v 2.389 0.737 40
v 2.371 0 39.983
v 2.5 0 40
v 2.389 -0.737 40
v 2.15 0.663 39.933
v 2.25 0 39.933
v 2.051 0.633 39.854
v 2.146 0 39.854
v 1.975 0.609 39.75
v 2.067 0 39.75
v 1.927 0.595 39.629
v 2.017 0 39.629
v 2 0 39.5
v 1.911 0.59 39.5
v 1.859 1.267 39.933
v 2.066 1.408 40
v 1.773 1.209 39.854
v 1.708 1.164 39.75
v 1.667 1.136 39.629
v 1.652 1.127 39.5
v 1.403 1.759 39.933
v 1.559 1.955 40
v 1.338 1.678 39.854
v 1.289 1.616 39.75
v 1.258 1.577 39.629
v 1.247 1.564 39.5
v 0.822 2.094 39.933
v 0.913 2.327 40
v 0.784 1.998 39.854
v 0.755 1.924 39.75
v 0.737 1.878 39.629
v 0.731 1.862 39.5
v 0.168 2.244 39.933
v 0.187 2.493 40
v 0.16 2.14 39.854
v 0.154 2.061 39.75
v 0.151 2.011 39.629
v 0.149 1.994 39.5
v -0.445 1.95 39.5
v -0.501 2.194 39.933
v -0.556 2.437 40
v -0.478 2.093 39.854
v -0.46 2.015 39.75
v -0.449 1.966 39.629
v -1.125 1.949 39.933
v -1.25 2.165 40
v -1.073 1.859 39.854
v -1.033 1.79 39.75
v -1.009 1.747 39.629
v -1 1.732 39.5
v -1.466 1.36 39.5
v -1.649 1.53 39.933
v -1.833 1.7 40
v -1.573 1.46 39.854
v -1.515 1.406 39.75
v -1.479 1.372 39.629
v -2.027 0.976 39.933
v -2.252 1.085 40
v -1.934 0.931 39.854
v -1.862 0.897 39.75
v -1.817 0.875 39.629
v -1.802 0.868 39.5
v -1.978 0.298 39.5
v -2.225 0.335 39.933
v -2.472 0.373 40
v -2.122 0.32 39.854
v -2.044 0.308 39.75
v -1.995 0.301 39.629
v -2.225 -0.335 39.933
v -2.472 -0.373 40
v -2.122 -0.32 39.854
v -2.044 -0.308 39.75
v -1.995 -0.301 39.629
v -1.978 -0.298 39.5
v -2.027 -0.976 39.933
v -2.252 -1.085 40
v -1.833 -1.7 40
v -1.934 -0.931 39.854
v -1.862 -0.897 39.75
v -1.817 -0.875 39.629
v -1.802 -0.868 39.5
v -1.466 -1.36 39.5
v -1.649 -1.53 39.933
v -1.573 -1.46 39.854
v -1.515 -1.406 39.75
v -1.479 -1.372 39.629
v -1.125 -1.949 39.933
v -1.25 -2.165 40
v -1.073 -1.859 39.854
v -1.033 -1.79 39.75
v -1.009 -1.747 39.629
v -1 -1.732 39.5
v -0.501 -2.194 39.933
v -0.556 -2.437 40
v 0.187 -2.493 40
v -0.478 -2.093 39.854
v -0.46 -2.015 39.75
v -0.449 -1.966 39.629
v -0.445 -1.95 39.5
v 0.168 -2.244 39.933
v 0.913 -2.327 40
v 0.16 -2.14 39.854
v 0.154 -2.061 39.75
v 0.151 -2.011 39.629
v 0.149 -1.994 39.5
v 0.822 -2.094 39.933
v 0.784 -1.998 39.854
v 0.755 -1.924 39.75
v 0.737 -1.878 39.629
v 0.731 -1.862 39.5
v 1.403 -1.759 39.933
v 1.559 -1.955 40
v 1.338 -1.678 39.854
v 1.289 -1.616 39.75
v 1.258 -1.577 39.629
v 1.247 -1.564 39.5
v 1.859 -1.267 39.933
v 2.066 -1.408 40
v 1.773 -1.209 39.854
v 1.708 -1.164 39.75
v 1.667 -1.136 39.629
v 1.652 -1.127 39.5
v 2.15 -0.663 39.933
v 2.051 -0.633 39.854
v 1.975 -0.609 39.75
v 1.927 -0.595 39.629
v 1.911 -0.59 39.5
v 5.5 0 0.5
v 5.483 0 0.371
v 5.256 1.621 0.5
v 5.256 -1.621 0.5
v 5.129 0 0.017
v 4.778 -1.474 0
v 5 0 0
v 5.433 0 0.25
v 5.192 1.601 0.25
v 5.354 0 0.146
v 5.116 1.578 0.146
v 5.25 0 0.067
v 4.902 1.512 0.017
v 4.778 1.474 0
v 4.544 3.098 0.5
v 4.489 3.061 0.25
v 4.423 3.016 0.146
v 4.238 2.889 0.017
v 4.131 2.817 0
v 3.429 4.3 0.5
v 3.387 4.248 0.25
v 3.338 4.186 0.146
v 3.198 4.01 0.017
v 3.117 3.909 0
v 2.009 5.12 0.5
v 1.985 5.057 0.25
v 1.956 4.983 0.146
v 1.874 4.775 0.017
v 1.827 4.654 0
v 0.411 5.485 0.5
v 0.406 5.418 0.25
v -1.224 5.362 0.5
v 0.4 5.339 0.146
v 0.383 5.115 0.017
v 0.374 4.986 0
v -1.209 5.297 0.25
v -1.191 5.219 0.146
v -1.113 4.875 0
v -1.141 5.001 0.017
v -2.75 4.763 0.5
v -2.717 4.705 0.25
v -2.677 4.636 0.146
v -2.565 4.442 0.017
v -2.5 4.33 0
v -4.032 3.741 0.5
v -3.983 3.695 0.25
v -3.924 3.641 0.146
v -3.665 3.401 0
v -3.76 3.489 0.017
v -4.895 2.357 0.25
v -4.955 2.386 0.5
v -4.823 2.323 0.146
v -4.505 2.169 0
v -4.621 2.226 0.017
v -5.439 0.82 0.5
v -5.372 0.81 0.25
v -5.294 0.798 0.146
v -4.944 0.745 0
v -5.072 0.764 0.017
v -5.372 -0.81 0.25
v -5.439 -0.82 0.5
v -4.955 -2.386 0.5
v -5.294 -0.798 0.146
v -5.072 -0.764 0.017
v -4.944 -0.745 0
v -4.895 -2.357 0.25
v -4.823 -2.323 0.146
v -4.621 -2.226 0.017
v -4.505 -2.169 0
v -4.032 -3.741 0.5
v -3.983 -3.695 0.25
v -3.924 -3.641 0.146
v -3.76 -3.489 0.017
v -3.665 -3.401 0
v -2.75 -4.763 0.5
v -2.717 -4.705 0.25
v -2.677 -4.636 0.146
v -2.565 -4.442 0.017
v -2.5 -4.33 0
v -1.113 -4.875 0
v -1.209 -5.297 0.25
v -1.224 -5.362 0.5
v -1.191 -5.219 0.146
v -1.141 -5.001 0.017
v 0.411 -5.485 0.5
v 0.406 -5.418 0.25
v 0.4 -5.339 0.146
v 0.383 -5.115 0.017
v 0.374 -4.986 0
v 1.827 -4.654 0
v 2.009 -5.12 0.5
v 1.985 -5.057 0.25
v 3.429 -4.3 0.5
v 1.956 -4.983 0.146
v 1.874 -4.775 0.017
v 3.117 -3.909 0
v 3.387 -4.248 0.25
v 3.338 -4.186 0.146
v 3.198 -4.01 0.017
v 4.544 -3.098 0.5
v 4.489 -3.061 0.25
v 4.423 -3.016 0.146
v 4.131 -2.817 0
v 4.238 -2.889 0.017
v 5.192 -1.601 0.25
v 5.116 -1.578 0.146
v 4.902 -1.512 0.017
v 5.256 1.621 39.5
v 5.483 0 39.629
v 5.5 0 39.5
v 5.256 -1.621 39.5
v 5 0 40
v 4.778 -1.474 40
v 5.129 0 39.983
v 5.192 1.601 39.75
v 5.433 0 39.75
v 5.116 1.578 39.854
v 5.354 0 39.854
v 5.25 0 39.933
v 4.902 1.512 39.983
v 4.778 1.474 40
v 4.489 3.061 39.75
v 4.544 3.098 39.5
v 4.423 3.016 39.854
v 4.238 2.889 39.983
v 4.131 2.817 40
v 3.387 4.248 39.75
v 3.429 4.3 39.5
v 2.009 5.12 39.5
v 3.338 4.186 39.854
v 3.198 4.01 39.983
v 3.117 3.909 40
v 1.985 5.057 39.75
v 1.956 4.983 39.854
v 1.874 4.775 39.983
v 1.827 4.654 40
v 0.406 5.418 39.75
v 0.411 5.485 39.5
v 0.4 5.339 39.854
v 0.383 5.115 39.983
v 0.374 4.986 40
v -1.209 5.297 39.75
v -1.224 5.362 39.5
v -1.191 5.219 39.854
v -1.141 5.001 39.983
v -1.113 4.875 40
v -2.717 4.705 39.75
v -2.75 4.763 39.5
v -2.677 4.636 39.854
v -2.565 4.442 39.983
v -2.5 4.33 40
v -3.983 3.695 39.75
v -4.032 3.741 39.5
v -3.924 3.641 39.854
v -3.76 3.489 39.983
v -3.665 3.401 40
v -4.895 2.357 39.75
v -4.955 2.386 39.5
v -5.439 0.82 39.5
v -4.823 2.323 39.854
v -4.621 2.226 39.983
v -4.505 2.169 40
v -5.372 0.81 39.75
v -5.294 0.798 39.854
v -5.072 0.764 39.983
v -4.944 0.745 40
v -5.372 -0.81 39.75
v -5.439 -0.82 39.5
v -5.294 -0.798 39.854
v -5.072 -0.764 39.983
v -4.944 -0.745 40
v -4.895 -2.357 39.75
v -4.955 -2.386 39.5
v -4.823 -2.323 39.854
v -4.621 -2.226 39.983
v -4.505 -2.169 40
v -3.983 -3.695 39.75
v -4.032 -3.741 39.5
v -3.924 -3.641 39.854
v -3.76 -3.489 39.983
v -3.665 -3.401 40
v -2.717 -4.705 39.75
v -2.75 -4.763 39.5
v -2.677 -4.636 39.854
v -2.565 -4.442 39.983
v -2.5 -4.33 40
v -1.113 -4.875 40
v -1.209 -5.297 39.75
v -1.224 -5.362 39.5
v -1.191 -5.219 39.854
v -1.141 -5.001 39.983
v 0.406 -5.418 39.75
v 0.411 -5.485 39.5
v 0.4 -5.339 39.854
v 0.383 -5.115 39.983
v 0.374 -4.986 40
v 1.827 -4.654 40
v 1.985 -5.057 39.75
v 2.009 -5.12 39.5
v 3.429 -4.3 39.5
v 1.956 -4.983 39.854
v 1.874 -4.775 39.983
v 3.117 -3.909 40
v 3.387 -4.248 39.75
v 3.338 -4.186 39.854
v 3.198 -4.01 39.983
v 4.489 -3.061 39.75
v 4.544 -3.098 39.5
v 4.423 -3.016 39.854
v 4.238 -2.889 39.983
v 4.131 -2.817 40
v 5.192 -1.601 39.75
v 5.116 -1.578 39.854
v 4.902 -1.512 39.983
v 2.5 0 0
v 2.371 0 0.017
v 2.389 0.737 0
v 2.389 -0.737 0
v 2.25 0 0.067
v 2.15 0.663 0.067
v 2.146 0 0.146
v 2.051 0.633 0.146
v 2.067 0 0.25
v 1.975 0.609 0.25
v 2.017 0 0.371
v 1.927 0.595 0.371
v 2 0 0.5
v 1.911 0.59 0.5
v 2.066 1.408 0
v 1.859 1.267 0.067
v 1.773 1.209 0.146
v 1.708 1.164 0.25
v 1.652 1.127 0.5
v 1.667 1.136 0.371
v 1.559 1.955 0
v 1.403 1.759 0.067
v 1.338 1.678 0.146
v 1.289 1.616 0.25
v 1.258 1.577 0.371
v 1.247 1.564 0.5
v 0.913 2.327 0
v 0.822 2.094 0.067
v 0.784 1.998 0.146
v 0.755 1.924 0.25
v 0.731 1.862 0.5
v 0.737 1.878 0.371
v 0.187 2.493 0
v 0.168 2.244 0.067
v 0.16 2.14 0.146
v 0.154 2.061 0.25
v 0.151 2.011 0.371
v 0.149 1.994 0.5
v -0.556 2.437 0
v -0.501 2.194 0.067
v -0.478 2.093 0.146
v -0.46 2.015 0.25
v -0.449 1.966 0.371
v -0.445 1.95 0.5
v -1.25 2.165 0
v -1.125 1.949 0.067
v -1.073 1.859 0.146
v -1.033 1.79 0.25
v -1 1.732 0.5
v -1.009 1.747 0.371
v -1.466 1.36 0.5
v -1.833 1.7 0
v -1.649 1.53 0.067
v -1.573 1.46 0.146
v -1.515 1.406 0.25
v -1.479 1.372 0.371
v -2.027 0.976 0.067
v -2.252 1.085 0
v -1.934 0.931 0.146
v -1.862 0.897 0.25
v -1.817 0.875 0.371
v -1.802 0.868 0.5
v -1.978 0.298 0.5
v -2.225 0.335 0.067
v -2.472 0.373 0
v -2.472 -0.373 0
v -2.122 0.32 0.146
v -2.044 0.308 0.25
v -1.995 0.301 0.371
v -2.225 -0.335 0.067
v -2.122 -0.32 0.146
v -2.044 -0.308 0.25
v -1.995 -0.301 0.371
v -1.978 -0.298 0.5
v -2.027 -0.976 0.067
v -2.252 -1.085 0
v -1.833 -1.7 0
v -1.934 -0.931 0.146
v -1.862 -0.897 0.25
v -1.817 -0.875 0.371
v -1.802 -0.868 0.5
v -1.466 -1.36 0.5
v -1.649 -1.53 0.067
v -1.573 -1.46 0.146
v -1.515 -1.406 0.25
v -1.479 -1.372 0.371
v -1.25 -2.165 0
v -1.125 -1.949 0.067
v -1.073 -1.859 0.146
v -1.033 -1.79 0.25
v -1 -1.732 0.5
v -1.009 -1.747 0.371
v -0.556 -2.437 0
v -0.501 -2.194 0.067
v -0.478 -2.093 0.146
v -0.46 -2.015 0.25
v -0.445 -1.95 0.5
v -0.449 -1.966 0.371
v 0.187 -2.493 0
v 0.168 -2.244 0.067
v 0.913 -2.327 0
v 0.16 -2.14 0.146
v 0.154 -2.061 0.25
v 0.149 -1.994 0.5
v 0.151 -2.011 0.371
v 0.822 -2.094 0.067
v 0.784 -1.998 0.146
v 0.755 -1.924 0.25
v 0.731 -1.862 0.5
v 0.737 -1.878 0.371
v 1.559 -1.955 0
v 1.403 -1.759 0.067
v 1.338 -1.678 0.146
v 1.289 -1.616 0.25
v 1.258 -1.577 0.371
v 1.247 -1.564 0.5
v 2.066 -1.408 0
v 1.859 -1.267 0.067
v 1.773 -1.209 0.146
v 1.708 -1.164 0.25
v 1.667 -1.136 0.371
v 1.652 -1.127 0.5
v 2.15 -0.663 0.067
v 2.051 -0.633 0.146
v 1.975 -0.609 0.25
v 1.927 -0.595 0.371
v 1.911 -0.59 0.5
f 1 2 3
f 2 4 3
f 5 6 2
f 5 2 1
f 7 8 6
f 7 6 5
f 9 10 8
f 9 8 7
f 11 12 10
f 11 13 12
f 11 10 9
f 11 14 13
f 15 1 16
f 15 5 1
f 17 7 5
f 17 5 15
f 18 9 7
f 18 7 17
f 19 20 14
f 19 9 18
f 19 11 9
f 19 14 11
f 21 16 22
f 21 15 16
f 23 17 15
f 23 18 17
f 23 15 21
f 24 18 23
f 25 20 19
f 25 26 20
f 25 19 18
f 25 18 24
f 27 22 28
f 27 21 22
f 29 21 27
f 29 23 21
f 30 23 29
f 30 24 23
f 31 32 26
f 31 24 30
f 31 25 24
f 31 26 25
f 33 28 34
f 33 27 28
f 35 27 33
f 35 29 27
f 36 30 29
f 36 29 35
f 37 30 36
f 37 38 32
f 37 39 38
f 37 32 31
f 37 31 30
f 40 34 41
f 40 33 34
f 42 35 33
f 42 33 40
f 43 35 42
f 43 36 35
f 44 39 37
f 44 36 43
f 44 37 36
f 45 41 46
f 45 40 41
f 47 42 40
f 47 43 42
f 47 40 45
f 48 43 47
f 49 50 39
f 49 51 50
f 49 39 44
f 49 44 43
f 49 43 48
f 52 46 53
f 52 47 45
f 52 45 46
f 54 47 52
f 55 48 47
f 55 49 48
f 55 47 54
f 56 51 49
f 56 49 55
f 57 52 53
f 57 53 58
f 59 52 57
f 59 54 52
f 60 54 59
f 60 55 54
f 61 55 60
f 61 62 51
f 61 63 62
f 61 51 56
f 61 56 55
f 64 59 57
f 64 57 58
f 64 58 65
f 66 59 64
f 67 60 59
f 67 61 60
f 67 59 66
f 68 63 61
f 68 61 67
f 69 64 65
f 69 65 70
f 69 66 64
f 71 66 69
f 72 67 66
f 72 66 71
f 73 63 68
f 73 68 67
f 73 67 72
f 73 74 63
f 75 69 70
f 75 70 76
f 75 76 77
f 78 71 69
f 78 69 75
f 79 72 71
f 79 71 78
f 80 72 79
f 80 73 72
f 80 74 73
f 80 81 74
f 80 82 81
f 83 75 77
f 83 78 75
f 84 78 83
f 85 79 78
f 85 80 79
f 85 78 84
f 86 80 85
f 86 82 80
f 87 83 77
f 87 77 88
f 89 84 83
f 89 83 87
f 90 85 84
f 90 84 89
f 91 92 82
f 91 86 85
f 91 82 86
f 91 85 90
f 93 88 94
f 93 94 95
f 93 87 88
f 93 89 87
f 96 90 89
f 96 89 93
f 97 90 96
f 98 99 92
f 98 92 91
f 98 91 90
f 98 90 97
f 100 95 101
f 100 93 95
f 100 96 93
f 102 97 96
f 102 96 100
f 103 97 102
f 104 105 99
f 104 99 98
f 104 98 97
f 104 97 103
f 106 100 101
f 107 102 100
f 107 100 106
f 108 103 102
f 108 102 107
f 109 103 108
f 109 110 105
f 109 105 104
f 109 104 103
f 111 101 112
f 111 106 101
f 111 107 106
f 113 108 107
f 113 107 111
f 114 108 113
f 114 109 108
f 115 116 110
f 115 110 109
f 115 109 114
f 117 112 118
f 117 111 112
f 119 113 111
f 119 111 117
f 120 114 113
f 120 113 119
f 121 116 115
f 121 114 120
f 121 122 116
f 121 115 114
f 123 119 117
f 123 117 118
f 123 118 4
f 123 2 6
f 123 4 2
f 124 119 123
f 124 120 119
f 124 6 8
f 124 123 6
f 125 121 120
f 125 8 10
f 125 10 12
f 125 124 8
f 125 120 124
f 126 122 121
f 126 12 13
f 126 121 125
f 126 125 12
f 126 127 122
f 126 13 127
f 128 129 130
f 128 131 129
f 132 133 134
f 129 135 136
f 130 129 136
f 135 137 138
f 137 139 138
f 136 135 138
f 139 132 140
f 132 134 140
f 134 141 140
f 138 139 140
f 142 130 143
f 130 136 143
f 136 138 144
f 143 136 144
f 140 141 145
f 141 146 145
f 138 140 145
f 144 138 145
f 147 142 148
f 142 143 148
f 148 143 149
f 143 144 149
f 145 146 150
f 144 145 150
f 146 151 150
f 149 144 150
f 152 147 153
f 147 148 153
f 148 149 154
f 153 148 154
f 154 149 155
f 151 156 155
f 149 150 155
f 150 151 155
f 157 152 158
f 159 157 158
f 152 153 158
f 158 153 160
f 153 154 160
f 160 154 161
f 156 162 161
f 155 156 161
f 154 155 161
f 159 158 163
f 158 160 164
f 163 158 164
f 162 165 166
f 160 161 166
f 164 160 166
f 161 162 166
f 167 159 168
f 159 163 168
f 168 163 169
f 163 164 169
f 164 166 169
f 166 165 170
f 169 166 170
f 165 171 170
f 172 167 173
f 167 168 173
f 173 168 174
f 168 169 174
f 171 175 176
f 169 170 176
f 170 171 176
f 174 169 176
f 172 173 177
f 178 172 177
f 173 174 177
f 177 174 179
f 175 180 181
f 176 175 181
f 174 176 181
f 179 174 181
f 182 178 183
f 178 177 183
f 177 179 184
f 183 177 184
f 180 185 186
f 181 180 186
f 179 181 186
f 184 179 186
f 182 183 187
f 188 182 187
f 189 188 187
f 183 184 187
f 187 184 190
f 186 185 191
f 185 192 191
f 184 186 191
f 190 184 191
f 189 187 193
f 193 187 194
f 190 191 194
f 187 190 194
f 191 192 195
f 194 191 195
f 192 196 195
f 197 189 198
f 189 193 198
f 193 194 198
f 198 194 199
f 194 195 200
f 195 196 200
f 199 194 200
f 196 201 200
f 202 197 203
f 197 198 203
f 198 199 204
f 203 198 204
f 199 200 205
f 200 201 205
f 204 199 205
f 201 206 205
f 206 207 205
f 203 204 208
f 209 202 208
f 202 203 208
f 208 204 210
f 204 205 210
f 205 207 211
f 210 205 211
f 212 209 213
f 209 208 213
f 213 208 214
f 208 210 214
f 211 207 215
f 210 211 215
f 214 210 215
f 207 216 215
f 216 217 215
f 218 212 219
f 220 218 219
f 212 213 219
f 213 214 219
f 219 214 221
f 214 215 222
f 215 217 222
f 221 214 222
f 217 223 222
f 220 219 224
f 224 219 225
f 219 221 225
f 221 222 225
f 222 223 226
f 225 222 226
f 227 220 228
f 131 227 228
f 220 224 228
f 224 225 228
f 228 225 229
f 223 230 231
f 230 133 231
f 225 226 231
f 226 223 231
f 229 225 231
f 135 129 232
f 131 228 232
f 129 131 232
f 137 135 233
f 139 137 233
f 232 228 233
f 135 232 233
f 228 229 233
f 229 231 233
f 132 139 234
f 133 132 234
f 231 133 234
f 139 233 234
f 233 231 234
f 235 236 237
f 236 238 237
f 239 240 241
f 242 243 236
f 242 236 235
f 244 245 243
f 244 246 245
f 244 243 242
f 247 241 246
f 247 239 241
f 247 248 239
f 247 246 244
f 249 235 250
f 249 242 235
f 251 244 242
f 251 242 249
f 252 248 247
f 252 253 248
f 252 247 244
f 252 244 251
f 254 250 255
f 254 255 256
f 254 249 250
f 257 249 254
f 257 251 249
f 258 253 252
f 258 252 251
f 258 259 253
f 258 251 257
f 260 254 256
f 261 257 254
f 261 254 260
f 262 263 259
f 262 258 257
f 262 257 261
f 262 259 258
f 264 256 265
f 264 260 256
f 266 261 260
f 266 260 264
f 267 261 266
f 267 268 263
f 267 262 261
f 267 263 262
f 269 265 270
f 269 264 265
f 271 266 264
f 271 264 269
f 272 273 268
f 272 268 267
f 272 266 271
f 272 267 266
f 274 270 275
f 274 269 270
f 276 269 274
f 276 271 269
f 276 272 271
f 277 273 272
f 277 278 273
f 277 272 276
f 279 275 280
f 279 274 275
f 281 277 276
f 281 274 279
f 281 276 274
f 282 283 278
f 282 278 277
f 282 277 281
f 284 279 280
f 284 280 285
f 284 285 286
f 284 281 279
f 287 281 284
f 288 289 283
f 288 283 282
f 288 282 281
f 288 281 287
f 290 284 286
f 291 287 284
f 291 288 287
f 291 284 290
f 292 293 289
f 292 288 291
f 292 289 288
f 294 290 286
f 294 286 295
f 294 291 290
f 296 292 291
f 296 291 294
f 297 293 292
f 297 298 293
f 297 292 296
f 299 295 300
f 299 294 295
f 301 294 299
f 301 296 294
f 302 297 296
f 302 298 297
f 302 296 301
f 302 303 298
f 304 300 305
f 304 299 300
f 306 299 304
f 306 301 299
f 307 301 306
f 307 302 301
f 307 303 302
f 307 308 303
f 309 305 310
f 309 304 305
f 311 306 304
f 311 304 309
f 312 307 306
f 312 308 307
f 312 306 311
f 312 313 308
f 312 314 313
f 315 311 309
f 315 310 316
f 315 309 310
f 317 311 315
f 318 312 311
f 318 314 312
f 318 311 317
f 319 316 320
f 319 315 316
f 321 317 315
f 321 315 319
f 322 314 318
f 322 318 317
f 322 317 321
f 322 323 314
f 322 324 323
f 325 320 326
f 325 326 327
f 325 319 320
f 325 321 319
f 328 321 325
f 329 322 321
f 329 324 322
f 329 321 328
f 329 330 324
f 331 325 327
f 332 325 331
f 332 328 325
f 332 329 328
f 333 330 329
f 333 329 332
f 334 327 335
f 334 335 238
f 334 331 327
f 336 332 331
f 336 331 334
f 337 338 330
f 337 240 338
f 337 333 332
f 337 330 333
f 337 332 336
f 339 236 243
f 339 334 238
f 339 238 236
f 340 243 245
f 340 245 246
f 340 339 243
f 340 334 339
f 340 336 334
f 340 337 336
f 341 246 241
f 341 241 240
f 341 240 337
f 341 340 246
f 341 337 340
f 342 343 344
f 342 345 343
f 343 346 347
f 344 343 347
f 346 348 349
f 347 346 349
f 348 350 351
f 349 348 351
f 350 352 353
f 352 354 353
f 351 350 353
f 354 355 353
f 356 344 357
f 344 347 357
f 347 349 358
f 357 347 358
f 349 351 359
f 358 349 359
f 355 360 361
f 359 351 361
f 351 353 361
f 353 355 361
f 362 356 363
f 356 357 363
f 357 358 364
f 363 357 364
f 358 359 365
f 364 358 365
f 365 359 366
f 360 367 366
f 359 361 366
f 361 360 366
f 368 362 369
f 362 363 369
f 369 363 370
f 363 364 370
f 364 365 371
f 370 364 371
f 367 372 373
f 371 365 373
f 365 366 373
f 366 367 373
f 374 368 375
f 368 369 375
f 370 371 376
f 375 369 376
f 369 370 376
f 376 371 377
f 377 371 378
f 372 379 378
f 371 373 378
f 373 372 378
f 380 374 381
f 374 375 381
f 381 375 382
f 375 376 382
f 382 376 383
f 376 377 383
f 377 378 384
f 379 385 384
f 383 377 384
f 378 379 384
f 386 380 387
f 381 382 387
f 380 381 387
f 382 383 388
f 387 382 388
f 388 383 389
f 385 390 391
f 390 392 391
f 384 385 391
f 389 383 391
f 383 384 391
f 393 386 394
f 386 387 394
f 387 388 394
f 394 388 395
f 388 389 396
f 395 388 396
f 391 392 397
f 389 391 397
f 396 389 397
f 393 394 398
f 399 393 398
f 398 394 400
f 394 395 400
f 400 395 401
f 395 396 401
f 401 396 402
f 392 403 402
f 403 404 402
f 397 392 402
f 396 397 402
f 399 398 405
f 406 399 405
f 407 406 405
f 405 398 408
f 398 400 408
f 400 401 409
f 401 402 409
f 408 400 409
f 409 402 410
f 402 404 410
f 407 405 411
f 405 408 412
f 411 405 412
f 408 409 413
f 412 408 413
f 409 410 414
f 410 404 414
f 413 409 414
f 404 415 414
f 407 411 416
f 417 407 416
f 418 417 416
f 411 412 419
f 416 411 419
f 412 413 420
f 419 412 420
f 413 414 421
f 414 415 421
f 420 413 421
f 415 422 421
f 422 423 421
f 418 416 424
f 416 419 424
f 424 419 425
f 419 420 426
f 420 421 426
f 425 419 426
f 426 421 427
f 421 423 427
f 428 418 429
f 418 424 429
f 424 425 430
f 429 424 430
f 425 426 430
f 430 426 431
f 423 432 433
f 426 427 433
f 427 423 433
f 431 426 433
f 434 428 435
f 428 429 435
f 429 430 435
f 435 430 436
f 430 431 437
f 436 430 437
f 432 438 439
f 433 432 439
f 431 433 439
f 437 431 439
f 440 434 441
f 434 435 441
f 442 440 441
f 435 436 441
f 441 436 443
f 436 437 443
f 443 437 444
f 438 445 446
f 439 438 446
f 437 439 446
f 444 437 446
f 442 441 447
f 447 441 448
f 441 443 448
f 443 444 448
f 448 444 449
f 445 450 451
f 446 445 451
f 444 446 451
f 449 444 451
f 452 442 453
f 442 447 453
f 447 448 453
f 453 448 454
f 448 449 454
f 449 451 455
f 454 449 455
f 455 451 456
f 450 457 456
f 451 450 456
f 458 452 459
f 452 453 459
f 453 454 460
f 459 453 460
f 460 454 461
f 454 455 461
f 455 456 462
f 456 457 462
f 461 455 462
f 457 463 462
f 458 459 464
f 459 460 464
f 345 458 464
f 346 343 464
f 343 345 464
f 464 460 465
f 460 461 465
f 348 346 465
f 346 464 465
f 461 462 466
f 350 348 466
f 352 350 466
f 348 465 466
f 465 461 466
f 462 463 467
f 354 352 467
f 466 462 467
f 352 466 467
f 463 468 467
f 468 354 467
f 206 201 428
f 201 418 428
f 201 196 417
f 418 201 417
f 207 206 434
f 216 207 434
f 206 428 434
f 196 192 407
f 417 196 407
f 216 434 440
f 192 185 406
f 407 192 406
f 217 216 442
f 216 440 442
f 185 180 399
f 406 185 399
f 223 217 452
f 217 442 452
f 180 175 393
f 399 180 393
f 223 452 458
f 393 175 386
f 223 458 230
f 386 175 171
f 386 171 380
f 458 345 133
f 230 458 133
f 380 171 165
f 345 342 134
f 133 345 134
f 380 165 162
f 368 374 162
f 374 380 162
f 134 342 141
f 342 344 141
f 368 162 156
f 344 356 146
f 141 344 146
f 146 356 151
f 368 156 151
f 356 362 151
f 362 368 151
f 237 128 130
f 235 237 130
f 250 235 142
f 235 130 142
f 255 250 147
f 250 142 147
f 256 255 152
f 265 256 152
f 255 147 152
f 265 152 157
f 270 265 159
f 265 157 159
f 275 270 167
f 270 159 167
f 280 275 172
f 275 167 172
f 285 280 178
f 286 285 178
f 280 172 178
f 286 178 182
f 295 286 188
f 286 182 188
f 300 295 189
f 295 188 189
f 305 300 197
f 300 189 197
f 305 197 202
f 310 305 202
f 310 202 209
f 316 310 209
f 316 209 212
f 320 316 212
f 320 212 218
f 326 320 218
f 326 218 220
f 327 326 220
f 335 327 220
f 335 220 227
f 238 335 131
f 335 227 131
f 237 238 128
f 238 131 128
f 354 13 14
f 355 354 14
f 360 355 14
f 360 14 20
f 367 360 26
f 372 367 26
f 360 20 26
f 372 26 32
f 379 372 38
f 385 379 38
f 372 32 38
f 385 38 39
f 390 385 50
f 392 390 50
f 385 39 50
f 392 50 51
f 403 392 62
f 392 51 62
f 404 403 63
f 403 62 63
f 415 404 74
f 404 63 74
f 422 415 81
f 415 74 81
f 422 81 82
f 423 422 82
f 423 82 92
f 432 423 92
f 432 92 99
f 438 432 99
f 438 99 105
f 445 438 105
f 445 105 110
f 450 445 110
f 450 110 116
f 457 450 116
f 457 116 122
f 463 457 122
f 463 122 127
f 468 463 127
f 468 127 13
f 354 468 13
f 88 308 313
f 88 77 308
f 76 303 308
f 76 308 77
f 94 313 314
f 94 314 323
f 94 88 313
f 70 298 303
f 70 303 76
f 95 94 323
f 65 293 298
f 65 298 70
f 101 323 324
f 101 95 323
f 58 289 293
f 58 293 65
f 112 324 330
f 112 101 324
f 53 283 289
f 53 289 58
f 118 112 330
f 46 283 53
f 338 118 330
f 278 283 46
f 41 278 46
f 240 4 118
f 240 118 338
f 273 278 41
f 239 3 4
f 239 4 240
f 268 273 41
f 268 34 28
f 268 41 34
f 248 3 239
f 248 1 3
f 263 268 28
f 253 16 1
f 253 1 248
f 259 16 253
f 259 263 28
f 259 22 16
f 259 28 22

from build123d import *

# Parameters (mm, degrees)
SKETCH1_R           = 5.5
BOSS_EXTRUDE1_DEPTH = 40
SKETCH2_R           = 2
CUT_EXTRUDE1_DEPTH  = 41
FILLET1_R           = 0.5


with BuildPart() as part:
    # Sketch1 → Boss-Extrude1 (new body)
    with BuildSketch(Plane.XY):
        Circle(SKETCH1_R)
    extrude(amount=BOSS_EXTRUDE1_DEPTH)

    # Sketch2 → Cut-Extrude1 (cut, through all)
    with BuildSketch(Plane.XY.offset(40)):
        Circle(SKETCH2_R)
    extrude(amount=-CUT_EXTRUDE1_DEPTH, mode=Mode.SUBTRACT)

    # Fillet1
    fillet1_edges = [part.edges().sort_by_distance(p)[0] for p in [
        (-5.5, 0, 0),
        (-5.5, 0, 40),
        (-2, 0, 0),
        (-2, 0, 40),
    ]]
    fillet(fillet1_edges, radius=FILLET1_R)


solid = part.part
